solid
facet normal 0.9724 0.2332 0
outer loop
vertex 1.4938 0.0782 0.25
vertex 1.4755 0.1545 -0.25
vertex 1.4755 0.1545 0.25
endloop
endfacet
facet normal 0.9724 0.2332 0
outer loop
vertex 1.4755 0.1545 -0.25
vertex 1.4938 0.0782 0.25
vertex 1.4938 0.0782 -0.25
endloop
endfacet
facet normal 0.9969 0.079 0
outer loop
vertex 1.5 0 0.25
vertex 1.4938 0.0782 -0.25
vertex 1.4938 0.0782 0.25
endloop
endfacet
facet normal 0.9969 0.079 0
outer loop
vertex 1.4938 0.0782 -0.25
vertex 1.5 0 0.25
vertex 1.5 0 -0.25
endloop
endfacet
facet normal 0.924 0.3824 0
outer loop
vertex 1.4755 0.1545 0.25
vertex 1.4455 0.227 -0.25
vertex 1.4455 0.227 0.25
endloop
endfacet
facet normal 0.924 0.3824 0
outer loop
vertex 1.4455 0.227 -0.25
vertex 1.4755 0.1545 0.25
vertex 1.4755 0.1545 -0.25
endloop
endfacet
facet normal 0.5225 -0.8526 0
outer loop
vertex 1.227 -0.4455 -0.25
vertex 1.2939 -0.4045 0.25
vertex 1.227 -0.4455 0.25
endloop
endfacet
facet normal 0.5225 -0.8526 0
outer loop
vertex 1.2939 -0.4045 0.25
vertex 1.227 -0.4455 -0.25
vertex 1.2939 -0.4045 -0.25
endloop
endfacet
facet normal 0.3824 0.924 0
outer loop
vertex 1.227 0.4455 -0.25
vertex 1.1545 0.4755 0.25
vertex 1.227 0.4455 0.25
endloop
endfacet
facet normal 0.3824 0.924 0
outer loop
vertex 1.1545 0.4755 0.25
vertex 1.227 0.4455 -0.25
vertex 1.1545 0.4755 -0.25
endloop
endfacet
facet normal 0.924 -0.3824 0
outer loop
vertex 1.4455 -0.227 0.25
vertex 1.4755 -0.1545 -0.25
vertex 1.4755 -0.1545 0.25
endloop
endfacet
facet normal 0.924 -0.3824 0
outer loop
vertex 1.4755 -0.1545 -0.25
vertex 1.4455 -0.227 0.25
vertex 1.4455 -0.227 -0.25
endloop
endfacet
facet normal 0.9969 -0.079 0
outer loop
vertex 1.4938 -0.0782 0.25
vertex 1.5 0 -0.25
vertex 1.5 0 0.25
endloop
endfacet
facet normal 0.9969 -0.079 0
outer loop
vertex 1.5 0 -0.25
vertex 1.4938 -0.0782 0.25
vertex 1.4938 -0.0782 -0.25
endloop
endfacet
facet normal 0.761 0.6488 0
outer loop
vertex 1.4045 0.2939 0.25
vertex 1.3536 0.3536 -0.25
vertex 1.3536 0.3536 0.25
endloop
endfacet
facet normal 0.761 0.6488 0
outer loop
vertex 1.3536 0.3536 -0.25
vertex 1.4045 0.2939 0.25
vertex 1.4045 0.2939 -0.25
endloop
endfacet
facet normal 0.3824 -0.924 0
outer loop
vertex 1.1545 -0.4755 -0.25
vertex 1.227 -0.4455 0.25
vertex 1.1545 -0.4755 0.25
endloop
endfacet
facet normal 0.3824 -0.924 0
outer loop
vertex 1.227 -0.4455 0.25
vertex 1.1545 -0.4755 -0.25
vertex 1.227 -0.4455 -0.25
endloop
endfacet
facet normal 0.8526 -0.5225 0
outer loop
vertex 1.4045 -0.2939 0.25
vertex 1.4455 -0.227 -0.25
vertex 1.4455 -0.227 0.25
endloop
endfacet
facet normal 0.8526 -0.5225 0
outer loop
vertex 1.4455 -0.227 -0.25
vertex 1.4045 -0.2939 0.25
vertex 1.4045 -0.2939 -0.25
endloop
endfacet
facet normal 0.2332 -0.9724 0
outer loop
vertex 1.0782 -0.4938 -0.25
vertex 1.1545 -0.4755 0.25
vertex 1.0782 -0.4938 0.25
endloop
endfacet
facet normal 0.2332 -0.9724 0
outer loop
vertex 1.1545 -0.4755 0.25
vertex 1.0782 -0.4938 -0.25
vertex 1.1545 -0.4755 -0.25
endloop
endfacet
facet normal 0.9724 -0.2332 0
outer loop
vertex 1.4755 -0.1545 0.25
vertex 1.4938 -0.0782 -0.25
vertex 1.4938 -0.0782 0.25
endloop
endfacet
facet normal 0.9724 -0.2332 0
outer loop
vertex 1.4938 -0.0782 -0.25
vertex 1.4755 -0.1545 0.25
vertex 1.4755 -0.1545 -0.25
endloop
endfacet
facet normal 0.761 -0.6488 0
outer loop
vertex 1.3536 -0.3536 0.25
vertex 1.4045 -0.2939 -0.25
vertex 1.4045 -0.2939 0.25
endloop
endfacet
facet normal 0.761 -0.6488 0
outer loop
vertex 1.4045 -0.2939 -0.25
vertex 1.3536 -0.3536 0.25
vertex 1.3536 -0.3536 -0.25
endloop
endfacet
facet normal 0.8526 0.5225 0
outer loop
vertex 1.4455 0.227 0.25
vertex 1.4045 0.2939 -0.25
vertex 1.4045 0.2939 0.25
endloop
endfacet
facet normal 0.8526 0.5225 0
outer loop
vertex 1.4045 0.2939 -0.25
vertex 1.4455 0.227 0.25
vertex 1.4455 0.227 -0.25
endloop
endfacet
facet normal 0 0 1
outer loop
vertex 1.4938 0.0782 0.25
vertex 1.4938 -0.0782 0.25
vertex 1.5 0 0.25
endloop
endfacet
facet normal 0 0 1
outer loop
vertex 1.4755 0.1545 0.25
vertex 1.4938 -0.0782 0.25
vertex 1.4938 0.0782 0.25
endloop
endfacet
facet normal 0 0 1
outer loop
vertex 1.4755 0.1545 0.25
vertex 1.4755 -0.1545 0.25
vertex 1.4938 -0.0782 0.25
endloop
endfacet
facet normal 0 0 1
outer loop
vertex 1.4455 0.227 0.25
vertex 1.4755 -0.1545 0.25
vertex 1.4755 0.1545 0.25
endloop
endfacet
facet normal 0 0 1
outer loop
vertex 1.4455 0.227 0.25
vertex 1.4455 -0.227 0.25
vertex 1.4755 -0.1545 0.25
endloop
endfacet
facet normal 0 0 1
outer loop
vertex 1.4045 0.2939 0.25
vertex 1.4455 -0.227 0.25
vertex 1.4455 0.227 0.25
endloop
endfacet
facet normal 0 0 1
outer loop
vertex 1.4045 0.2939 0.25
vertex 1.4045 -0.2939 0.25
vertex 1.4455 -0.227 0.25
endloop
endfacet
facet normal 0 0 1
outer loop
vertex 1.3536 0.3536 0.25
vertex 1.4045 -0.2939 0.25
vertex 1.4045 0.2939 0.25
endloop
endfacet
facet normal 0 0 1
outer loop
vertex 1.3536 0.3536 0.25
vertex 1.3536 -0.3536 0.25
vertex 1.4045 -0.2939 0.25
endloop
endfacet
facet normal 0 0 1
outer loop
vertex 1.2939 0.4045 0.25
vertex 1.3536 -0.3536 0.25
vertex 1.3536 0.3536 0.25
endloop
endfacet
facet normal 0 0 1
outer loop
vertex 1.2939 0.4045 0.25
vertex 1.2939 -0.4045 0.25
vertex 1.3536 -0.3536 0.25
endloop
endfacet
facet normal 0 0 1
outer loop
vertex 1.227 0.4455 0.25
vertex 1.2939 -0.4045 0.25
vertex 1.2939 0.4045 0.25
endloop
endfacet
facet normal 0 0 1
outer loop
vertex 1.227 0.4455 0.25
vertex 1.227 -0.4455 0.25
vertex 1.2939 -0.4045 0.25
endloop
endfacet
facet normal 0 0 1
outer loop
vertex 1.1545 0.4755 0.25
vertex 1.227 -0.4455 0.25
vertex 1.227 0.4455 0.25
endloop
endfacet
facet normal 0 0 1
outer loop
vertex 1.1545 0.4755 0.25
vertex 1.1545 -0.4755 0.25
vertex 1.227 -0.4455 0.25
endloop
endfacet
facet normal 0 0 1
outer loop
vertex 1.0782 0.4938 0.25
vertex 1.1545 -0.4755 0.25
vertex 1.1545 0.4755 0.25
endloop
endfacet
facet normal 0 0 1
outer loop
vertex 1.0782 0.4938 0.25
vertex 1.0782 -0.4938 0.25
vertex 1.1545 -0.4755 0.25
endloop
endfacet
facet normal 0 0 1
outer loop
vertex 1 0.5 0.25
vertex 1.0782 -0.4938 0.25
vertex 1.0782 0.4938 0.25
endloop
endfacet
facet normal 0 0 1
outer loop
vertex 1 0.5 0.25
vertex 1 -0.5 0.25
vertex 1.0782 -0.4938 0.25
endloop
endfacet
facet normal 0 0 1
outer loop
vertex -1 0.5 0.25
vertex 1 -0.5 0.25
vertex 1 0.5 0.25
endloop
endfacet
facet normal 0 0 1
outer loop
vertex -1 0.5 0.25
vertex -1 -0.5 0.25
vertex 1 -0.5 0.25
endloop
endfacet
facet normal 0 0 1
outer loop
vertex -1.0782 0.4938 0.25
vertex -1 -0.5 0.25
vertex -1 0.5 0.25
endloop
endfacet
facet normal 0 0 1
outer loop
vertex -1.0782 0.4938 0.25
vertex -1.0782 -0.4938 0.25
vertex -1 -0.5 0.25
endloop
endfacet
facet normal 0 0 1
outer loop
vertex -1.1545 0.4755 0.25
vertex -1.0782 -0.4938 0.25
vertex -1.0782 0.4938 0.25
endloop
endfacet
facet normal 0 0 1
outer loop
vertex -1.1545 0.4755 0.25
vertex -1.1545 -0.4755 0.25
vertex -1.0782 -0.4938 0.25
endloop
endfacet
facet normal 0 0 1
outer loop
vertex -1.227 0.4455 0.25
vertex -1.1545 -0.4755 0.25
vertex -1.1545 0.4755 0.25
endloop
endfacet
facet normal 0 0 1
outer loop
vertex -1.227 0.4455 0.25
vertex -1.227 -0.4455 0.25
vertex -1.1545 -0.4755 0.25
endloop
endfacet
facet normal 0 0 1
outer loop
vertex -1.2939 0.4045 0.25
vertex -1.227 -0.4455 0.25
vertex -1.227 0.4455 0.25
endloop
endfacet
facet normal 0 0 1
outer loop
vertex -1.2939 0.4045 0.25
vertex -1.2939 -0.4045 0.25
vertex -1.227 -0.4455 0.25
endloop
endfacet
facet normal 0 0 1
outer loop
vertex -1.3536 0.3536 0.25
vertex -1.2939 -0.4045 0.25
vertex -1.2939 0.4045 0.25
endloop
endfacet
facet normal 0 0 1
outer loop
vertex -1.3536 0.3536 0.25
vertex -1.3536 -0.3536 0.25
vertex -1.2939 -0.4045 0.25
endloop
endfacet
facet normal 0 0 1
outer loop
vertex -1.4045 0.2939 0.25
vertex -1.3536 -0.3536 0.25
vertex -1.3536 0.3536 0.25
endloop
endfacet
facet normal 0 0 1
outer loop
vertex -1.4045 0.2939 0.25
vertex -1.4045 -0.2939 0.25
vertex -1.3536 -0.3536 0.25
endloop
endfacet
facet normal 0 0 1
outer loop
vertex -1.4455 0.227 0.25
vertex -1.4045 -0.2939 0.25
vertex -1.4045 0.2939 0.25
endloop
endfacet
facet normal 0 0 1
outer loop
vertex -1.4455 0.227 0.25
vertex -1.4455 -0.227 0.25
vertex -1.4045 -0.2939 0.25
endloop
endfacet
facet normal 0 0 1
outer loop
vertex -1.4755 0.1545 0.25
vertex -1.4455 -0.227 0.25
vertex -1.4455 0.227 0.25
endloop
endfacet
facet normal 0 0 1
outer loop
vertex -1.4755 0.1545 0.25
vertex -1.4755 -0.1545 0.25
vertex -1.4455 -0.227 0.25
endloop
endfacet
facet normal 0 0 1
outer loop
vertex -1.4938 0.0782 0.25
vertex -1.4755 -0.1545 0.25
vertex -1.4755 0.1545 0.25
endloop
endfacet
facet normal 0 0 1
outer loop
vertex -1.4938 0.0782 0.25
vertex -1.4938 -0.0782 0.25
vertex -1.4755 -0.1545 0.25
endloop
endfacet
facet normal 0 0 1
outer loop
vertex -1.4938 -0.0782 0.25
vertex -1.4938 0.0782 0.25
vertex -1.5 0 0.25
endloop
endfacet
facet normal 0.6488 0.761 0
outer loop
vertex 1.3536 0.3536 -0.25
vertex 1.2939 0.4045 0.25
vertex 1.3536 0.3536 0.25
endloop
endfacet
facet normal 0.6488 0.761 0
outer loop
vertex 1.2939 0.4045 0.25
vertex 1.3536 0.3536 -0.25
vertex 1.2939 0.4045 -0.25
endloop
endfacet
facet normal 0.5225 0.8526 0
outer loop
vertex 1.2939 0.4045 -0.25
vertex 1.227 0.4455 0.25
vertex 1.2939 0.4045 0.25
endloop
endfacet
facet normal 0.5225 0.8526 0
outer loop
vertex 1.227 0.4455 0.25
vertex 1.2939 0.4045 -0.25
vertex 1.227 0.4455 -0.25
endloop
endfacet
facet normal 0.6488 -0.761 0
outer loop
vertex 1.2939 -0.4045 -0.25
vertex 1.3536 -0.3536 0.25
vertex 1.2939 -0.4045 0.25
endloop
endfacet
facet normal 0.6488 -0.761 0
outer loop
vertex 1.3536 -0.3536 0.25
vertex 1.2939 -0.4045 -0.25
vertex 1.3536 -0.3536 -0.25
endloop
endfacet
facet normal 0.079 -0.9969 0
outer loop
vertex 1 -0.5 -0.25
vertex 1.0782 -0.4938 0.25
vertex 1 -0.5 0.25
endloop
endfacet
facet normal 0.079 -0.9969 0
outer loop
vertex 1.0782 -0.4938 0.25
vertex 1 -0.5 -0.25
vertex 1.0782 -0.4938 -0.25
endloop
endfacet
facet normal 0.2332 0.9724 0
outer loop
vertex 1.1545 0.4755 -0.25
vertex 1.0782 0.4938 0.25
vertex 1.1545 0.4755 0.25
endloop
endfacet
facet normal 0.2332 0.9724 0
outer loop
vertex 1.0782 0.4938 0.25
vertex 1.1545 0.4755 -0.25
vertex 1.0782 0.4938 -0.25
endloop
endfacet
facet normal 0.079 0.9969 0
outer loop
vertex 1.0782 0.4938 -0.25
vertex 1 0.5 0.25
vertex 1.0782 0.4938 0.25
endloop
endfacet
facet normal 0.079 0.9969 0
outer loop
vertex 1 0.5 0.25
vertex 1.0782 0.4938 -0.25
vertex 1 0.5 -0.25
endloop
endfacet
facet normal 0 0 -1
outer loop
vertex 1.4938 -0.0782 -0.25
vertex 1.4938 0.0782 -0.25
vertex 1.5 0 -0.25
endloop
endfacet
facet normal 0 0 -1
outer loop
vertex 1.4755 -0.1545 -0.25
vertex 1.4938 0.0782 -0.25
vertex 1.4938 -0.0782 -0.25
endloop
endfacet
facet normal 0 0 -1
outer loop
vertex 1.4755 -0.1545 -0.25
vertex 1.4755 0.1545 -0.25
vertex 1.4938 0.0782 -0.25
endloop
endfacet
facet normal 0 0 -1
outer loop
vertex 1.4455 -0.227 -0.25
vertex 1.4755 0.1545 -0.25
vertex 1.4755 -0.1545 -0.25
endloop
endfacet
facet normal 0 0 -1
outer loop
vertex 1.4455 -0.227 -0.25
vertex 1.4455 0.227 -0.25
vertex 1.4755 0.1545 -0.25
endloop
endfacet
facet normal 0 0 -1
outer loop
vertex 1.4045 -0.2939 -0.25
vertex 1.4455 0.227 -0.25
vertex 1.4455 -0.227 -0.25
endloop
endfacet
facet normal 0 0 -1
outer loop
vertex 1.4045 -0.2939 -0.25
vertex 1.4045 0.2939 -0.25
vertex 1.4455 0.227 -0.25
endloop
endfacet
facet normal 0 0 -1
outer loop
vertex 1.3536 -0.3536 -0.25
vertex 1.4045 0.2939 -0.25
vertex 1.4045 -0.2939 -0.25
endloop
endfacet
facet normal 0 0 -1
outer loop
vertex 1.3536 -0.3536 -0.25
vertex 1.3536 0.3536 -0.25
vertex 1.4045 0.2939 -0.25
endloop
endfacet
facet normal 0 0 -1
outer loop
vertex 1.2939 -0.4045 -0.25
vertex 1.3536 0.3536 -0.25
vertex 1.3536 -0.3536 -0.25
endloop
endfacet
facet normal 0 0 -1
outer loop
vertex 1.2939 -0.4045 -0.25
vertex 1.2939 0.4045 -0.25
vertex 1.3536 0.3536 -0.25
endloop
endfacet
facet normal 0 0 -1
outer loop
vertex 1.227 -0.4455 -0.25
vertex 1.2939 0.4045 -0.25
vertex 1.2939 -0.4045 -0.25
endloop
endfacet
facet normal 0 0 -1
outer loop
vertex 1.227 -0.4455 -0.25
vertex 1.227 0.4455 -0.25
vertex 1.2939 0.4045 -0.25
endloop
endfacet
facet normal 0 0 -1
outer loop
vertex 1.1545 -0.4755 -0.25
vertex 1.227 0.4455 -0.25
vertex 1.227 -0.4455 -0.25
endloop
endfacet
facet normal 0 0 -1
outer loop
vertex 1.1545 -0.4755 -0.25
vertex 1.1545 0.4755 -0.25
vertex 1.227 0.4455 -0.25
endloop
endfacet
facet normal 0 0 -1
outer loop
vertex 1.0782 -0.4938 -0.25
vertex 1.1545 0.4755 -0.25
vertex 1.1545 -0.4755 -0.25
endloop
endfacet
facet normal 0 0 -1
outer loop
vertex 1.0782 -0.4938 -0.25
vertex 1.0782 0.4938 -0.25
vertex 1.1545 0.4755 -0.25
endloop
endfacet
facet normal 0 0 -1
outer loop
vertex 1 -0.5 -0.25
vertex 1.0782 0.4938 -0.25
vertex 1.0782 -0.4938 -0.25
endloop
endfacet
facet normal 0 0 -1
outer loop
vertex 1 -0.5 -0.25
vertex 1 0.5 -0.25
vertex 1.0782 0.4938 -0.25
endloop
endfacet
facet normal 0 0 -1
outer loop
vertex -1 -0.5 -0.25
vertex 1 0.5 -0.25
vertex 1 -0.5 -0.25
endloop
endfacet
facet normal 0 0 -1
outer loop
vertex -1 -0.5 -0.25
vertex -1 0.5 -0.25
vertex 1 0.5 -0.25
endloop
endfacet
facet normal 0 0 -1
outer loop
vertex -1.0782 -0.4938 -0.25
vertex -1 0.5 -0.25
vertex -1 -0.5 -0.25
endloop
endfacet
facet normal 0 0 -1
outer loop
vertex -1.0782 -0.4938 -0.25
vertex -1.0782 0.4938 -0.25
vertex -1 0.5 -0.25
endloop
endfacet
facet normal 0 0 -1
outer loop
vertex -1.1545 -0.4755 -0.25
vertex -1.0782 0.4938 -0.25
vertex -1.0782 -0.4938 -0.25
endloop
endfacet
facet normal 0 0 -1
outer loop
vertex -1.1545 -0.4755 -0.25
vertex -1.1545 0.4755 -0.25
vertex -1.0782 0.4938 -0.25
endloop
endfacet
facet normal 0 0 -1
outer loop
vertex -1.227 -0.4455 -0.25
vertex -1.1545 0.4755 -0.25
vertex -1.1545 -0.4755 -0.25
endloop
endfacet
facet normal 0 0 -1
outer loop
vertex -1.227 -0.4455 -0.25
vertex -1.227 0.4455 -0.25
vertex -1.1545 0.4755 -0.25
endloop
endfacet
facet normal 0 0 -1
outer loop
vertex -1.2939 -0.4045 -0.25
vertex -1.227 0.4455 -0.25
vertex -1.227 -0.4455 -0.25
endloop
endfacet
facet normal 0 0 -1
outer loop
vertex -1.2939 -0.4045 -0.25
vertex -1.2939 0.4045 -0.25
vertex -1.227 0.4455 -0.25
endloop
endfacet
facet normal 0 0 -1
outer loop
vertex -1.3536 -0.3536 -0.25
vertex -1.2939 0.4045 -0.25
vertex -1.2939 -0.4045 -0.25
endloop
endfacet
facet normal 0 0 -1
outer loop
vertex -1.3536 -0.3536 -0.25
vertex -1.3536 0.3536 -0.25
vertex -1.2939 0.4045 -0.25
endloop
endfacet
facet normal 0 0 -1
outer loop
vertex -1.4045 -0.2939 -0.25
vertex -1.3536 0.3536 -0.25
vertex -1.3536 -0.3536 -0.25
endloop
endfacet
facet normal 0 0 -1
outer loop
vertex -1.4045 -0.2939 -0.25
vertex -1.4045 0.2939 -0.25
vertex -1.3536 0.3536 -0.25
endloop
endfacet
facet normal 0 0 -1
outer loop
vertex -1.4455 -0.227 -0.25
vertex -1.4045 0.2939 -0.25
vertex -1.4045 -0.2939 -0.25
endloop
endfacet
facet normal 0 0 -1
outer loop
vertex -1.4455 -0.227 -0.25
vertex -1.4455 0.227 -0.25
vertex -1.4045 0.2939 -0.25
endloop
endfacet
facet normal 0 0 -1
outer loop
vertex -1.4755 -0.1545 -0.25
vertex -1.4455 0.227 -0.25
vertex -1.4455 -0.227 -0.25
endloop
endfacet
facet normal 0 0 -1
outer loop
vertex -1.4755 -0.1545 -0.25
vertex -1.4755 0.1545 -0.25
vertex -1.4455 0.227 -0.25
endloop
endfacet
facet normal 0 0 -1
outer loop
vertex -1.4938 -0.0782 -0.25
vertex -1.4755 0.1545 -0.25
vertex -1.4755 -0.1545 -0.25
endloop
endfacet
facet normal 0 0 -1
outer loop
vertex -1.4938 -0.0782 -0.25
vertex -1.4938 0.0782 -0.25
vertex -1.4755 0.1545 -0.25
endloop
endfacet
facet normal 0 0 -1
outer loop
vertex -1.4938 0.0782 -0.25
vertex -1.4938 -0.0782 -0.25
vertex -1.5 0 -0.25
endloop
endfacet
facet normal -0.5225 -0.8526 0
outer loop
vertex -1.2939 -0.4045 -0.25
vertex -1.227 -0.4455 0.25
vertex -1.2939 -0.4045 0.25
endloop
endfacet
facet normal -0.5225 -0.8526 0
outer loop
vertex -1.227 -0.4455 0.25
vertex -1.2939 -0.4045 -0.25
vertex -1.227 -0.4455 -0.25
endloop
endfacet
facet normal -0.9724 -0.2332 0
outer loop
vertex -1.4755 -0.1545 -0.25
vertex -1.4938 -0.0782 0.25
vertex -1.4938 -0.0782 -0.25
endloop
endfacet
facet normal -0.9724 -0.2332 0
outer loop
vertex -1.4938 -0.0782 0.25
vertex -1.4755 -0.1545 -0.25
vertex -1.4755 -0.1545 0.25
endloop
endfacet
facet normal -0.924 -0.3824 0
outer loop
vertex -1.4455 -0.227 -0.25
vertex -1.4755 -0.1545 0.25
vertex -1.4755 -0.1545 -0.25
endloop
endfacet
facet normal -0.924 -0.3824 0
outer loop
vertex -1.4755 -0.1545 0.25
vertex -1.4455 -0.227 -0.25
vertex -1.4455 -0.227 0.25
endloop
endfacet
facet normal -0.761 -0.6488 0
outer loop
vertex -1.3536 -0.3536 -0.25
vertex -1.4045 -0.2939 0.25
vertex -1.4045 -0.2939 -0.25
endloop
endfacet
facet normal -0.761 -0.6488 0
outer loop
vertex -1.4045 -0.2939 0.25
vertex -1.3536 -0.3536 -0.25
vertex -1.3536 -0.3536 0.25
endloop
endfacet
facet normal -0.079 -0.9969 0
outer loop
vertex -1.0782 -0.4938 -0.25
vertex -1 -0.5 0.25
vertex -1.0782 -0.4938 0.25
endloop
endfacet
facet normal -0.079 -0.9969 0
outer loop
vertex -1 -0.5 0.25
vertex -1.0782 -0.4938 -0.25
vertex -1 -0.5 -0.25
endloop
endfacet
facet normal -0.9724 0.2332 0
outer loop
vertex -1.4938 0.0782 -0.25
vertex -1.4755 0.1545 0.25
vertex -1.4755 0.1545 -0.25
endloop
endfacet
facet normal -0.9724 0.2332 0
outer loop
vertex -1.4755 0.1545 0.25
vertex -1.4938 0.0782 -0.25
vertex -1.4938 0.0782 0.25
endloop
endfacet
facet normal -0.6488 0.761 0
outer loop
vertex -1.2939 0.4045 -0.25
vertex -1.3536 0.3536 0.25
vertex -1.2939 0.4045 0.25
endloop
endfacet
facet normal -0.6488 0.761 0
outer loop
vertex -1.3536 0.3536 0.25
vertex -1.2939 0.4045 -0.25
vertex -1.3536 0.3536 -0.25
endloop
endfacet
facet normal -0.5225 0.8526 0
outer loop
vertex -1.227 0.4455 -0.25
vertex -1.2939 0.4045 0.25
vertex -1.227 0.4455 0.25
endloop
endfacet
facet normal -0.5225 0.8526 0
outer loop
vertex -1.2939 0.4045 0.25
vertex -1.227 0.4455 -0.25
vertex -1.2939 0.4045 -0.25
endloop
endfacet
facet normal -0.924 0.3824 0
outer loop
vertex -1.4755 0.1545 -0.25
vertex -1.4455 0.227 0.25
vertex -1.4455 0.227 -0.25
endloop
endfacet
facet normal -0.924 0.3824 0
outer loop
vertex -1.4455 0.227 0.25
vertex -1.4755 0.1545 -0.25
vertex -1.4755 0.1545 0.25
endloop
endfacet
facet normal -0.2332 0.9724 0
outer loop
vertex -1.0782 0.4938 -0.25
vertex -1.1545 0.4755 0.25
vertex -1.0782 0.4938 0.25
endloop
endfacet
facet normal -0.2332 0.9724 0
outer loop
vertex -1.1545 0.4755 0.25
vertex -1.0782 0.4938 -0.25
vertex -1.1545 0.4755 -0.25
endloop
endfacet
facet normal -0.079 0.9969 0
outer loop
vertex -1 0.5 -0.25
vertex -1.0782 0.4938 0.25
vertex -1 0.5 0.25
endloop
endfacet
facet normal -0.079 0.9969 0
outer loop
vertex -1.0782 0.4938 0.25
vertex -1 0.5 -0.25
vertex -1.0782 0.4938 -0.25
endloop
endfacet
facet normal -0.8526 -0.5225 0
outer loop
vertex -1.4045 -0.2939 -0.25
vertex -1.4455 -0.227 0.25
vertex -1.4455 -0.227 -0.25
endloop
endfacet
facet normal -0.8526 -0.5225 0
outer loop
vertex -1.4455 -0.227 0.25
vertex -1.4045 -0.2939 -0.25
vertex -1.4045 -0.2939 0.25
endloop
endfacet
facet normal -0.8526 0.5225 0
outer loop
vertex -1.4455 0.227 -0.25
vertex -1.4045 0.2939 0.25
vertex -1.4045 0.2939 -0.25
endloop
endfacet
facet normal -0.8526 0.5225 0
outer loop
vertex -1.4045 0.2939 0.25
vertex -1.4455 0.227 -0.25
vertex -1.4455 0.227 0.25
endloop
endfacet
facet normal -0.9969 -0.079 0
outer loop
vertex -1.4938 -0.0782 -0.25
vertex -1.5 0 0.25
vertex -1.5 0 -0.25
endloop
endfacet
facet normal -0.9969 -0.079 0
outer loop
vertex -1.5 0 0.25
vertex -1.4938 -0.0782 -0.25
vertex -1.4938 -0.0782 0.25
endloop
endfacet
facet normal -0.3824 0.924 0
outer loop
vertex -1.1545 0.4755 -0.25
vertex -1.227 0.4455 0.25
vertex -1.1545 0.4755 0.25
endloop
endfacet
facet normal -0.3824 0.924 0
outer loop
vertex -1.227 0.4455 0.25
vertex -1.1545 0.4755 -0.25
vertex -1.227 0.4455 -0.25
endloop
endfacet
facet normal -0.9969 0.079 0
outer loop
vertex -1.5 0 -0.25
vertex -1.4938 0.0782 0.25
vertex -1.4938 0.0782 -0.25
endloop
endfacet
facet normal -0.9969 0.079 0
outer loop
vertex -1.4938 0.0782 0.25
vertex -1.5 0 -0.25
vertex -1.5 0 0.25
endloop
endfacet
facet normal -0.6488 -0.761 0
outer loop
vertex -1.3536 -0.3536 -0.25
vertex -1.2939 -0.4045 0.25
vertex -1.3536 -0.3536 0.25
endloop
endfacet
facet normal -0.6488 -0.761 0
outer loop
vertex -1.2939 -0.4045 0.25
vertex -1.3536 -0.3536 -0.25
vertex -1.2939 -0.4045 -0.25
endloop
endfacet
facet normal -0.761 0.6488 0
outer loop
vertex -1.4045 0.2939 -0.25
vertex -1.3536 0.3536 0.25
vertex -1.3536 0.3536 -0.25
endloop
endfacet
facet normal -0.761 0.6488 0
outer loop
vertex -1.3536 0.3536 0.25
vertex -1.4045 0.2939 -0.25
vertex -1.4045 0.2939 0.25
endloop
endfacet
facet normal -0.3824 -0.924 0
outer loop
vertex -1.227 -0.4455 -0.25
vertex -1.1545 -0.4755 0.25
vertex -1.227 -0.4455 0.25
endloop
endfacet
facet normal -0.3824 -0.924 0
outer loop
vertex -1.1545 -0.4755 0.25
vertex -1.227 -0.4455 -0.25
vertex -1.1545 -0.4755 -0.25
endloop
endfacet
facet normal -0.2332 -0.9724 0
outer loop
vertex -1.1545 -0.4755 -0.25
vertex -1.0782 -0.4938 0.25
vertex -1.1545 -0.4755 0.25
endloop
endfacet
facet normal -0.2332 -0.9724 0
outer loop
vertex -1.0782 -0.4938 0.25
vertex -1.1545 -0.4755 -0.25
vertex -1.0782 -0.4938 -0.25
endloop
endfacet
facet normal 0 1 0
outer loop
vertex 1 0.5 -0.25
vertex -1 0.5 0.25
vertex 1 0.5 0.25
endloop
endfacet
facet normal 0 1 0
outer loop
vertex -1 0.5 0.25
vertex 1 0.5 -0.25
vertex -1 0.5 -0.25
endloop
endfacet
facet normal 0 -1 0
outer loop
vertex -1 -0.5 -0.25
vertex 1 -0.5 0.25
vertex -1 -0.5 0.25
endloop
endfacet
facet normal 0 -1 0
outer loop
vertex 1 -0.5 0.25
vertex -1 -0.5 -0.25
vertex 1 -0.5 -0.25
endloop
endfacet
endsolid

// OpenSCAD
module Key(){

    Key_Lenght = (10);
    Key_Height = 10;
    Key_Width = 15;

    color("#a8b0b2")
    union(){
        translate([1,0,0])
        cylinder(0.5,0.5,0.5, $fn=40, center=true);

        translate([-1,0,0])
        cylinder(0.5,0.5,0.5, $fn=40, center=true);

        cube([2,1,0.5],center = true);
    }


}

rotate([$t*100,0,0])
Key();



// Written by Nicolì Angelo (Gengio) 2024: 
// MIT License

//Permission is hereby granted, free of charge, to any person obtaining a copy of this software and associated documentation files (the "Software"), to deal in the Software without restriction, including without limitation the rights to use, copy, modify, merge, publish, distribute, sublicense, and/or sell copies of the Software, and to permit persons to whom the Software is furnished to do so, subject to the following conditions:

//The above copyright notice and this permission notice shall be included in all copies or substantial portions of the Software.

//THE SOFTWARE IS PROVIDED "AS IS", WITHOUT WARRANTY OF ANY KIND, EXPRESS OR IMPLIED, INCLUDING BUT NOT LIMITED TO THE WARRANTIES OF MERCHANTABILITY, FITNESS FOR A PARTICULAR PURPOSE AND NONINFRINGEMENT. IN NO EVENT SHALL THE AUTHORS OR COPYRIGHT HOLDERS BE LIABLE FOR ANY CLAIM, DAMAGES OR OTHER LIABILITY, WHETHER IN AN ACTION OF CONTRACT, TORT OR OTHERWISE, ARISING FROM, OUT OF OR IN CONNECTION WITH THE SOFTWARE OR THE USE OR OTHER DEALINGS IN THE SOFTWARE.
